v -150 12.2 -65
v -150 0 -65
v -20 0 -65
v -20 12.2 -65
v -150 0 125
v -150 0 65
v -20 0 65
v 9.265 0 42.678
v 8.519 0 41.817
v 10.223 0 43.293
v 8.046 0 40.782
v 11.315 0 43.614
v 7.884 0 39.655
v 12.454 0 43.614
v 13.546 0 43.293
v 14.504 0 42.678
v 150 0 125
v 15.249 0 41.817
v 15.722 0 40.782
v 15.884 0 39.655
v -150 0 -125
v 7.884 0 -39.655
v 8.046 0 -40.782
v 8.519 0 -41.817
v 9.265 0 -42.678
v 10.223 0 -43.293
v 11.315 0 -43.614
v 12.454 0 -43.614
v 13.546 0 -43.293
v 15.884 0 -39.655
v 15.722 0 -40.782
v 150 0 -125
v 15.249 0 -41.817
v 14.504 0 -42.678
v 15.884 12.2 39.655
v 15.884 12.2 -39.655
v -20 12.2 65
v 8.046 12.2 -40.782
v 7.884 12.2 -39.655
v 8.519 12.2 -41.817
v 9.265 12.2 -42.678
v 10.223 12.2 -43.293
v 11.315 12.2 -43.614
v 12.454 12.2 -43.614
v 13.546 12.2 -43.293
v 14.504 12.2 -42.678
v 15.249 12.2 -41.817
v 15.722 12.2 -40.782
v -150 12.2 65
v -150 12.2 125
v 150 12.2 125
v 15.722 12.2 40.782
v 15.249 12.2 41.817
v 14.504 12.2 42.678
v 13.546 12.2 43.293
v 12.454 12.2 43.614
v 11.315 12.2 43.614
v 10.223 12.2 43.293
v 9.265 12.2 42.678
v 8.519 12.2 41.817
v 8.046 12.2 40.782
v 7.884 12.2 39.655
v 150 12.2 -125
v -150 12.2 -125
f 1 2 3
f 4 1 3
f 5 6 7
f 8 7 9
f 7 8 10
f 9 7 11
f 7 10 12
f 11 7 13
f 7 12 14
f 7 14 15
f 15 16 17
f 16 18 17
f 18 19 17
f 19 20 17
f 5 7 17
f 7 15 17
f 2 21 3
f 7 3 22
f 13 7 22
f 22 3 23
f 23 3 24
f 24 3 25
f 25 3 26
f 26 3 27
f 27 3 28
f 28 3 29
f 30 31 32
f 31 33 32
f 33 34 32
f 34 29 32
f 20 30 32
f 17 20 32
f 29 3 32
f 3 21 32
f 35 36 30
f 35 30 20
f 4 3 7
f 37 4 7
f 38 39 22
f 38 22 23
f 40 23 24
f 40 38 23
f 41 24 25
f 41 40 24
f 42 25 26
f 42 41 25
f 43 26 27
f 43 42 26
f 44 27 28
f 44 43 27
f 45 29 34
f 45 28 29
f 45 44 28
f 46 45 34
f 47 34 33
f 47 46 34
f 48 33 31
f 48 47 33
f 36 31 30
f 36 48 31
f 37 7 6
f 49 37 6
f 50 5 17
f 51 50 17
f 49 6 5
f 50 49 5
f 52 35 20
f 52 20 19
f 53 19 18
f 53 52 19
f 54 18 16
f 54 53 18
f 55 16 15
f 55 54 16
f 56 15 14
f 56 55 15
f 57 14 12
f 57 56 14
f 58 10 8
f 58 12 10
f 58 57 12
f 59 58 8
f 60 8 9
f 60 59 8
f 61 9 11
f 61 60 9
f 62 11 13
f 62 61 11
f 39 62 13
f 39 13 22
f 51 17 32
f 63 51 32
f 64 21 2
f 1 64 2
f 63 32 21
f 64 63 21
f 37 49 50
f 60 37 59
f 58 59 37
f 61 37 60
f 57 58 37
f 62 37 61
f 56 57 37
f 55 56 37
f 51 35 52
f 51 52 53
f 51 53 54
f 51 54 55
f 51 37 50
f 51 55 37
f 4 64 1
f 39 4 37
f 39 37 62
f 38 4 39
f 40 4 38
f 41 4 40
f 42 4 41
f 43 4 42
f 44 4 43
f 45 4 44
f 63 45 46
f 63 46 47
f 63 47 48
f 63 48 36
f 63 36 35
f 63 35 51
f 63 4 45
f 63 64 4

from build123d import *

# Parameters (mm, degrees)
BOSS_EXTRUDE2_DEPTH = 12.2
CUT_EXTRUDE1_DEPTH  = 30


with BuildPart() as part:
    # Sketch1 → Boss-Extrude2 (new body)
    with BuildSketch(Plane(origin=(0, 0, 0), x_dir=(1, 0, 0), z_dir=(0, 1, 0))):
        Polygon((150, 125), (-150, 125), (-150, 65), (-20, 65), (-20, -65), (-150, -65), (-150, -125), (150, -125), align=None)
    extrude(amount=BOSS_EXTRUDE2_DEPTH)

    # Sketch2 → Cut-Extrude1 (cut)
    with BuildSketch(Plane(origin=(0, 12.2, 0), x_dir=(1, 0, 0), z_dir=(0, 1, 0))):
        with BuildLine():
            Line((15.884395788, 39.654803454), (15.884395788, -39.654803454))
            ThreePointArc((15.884395788, -39.654803454), (11.884395788, -43.654803454), (7.884395788, -39.654803454))
            Line((7.884395788, -39.654803454), (7.884395788, 39.654803454))
            ThreePointArc((7.884395788, 39.654803454), (11.884395788, 43.654803454), (15.884395788, 39.654803454))
        make_face()
    extrude(amount=-CUT_EXTRUDE1_DEPTH, mode=Mode.SUBTRACT)


solid = part.part
